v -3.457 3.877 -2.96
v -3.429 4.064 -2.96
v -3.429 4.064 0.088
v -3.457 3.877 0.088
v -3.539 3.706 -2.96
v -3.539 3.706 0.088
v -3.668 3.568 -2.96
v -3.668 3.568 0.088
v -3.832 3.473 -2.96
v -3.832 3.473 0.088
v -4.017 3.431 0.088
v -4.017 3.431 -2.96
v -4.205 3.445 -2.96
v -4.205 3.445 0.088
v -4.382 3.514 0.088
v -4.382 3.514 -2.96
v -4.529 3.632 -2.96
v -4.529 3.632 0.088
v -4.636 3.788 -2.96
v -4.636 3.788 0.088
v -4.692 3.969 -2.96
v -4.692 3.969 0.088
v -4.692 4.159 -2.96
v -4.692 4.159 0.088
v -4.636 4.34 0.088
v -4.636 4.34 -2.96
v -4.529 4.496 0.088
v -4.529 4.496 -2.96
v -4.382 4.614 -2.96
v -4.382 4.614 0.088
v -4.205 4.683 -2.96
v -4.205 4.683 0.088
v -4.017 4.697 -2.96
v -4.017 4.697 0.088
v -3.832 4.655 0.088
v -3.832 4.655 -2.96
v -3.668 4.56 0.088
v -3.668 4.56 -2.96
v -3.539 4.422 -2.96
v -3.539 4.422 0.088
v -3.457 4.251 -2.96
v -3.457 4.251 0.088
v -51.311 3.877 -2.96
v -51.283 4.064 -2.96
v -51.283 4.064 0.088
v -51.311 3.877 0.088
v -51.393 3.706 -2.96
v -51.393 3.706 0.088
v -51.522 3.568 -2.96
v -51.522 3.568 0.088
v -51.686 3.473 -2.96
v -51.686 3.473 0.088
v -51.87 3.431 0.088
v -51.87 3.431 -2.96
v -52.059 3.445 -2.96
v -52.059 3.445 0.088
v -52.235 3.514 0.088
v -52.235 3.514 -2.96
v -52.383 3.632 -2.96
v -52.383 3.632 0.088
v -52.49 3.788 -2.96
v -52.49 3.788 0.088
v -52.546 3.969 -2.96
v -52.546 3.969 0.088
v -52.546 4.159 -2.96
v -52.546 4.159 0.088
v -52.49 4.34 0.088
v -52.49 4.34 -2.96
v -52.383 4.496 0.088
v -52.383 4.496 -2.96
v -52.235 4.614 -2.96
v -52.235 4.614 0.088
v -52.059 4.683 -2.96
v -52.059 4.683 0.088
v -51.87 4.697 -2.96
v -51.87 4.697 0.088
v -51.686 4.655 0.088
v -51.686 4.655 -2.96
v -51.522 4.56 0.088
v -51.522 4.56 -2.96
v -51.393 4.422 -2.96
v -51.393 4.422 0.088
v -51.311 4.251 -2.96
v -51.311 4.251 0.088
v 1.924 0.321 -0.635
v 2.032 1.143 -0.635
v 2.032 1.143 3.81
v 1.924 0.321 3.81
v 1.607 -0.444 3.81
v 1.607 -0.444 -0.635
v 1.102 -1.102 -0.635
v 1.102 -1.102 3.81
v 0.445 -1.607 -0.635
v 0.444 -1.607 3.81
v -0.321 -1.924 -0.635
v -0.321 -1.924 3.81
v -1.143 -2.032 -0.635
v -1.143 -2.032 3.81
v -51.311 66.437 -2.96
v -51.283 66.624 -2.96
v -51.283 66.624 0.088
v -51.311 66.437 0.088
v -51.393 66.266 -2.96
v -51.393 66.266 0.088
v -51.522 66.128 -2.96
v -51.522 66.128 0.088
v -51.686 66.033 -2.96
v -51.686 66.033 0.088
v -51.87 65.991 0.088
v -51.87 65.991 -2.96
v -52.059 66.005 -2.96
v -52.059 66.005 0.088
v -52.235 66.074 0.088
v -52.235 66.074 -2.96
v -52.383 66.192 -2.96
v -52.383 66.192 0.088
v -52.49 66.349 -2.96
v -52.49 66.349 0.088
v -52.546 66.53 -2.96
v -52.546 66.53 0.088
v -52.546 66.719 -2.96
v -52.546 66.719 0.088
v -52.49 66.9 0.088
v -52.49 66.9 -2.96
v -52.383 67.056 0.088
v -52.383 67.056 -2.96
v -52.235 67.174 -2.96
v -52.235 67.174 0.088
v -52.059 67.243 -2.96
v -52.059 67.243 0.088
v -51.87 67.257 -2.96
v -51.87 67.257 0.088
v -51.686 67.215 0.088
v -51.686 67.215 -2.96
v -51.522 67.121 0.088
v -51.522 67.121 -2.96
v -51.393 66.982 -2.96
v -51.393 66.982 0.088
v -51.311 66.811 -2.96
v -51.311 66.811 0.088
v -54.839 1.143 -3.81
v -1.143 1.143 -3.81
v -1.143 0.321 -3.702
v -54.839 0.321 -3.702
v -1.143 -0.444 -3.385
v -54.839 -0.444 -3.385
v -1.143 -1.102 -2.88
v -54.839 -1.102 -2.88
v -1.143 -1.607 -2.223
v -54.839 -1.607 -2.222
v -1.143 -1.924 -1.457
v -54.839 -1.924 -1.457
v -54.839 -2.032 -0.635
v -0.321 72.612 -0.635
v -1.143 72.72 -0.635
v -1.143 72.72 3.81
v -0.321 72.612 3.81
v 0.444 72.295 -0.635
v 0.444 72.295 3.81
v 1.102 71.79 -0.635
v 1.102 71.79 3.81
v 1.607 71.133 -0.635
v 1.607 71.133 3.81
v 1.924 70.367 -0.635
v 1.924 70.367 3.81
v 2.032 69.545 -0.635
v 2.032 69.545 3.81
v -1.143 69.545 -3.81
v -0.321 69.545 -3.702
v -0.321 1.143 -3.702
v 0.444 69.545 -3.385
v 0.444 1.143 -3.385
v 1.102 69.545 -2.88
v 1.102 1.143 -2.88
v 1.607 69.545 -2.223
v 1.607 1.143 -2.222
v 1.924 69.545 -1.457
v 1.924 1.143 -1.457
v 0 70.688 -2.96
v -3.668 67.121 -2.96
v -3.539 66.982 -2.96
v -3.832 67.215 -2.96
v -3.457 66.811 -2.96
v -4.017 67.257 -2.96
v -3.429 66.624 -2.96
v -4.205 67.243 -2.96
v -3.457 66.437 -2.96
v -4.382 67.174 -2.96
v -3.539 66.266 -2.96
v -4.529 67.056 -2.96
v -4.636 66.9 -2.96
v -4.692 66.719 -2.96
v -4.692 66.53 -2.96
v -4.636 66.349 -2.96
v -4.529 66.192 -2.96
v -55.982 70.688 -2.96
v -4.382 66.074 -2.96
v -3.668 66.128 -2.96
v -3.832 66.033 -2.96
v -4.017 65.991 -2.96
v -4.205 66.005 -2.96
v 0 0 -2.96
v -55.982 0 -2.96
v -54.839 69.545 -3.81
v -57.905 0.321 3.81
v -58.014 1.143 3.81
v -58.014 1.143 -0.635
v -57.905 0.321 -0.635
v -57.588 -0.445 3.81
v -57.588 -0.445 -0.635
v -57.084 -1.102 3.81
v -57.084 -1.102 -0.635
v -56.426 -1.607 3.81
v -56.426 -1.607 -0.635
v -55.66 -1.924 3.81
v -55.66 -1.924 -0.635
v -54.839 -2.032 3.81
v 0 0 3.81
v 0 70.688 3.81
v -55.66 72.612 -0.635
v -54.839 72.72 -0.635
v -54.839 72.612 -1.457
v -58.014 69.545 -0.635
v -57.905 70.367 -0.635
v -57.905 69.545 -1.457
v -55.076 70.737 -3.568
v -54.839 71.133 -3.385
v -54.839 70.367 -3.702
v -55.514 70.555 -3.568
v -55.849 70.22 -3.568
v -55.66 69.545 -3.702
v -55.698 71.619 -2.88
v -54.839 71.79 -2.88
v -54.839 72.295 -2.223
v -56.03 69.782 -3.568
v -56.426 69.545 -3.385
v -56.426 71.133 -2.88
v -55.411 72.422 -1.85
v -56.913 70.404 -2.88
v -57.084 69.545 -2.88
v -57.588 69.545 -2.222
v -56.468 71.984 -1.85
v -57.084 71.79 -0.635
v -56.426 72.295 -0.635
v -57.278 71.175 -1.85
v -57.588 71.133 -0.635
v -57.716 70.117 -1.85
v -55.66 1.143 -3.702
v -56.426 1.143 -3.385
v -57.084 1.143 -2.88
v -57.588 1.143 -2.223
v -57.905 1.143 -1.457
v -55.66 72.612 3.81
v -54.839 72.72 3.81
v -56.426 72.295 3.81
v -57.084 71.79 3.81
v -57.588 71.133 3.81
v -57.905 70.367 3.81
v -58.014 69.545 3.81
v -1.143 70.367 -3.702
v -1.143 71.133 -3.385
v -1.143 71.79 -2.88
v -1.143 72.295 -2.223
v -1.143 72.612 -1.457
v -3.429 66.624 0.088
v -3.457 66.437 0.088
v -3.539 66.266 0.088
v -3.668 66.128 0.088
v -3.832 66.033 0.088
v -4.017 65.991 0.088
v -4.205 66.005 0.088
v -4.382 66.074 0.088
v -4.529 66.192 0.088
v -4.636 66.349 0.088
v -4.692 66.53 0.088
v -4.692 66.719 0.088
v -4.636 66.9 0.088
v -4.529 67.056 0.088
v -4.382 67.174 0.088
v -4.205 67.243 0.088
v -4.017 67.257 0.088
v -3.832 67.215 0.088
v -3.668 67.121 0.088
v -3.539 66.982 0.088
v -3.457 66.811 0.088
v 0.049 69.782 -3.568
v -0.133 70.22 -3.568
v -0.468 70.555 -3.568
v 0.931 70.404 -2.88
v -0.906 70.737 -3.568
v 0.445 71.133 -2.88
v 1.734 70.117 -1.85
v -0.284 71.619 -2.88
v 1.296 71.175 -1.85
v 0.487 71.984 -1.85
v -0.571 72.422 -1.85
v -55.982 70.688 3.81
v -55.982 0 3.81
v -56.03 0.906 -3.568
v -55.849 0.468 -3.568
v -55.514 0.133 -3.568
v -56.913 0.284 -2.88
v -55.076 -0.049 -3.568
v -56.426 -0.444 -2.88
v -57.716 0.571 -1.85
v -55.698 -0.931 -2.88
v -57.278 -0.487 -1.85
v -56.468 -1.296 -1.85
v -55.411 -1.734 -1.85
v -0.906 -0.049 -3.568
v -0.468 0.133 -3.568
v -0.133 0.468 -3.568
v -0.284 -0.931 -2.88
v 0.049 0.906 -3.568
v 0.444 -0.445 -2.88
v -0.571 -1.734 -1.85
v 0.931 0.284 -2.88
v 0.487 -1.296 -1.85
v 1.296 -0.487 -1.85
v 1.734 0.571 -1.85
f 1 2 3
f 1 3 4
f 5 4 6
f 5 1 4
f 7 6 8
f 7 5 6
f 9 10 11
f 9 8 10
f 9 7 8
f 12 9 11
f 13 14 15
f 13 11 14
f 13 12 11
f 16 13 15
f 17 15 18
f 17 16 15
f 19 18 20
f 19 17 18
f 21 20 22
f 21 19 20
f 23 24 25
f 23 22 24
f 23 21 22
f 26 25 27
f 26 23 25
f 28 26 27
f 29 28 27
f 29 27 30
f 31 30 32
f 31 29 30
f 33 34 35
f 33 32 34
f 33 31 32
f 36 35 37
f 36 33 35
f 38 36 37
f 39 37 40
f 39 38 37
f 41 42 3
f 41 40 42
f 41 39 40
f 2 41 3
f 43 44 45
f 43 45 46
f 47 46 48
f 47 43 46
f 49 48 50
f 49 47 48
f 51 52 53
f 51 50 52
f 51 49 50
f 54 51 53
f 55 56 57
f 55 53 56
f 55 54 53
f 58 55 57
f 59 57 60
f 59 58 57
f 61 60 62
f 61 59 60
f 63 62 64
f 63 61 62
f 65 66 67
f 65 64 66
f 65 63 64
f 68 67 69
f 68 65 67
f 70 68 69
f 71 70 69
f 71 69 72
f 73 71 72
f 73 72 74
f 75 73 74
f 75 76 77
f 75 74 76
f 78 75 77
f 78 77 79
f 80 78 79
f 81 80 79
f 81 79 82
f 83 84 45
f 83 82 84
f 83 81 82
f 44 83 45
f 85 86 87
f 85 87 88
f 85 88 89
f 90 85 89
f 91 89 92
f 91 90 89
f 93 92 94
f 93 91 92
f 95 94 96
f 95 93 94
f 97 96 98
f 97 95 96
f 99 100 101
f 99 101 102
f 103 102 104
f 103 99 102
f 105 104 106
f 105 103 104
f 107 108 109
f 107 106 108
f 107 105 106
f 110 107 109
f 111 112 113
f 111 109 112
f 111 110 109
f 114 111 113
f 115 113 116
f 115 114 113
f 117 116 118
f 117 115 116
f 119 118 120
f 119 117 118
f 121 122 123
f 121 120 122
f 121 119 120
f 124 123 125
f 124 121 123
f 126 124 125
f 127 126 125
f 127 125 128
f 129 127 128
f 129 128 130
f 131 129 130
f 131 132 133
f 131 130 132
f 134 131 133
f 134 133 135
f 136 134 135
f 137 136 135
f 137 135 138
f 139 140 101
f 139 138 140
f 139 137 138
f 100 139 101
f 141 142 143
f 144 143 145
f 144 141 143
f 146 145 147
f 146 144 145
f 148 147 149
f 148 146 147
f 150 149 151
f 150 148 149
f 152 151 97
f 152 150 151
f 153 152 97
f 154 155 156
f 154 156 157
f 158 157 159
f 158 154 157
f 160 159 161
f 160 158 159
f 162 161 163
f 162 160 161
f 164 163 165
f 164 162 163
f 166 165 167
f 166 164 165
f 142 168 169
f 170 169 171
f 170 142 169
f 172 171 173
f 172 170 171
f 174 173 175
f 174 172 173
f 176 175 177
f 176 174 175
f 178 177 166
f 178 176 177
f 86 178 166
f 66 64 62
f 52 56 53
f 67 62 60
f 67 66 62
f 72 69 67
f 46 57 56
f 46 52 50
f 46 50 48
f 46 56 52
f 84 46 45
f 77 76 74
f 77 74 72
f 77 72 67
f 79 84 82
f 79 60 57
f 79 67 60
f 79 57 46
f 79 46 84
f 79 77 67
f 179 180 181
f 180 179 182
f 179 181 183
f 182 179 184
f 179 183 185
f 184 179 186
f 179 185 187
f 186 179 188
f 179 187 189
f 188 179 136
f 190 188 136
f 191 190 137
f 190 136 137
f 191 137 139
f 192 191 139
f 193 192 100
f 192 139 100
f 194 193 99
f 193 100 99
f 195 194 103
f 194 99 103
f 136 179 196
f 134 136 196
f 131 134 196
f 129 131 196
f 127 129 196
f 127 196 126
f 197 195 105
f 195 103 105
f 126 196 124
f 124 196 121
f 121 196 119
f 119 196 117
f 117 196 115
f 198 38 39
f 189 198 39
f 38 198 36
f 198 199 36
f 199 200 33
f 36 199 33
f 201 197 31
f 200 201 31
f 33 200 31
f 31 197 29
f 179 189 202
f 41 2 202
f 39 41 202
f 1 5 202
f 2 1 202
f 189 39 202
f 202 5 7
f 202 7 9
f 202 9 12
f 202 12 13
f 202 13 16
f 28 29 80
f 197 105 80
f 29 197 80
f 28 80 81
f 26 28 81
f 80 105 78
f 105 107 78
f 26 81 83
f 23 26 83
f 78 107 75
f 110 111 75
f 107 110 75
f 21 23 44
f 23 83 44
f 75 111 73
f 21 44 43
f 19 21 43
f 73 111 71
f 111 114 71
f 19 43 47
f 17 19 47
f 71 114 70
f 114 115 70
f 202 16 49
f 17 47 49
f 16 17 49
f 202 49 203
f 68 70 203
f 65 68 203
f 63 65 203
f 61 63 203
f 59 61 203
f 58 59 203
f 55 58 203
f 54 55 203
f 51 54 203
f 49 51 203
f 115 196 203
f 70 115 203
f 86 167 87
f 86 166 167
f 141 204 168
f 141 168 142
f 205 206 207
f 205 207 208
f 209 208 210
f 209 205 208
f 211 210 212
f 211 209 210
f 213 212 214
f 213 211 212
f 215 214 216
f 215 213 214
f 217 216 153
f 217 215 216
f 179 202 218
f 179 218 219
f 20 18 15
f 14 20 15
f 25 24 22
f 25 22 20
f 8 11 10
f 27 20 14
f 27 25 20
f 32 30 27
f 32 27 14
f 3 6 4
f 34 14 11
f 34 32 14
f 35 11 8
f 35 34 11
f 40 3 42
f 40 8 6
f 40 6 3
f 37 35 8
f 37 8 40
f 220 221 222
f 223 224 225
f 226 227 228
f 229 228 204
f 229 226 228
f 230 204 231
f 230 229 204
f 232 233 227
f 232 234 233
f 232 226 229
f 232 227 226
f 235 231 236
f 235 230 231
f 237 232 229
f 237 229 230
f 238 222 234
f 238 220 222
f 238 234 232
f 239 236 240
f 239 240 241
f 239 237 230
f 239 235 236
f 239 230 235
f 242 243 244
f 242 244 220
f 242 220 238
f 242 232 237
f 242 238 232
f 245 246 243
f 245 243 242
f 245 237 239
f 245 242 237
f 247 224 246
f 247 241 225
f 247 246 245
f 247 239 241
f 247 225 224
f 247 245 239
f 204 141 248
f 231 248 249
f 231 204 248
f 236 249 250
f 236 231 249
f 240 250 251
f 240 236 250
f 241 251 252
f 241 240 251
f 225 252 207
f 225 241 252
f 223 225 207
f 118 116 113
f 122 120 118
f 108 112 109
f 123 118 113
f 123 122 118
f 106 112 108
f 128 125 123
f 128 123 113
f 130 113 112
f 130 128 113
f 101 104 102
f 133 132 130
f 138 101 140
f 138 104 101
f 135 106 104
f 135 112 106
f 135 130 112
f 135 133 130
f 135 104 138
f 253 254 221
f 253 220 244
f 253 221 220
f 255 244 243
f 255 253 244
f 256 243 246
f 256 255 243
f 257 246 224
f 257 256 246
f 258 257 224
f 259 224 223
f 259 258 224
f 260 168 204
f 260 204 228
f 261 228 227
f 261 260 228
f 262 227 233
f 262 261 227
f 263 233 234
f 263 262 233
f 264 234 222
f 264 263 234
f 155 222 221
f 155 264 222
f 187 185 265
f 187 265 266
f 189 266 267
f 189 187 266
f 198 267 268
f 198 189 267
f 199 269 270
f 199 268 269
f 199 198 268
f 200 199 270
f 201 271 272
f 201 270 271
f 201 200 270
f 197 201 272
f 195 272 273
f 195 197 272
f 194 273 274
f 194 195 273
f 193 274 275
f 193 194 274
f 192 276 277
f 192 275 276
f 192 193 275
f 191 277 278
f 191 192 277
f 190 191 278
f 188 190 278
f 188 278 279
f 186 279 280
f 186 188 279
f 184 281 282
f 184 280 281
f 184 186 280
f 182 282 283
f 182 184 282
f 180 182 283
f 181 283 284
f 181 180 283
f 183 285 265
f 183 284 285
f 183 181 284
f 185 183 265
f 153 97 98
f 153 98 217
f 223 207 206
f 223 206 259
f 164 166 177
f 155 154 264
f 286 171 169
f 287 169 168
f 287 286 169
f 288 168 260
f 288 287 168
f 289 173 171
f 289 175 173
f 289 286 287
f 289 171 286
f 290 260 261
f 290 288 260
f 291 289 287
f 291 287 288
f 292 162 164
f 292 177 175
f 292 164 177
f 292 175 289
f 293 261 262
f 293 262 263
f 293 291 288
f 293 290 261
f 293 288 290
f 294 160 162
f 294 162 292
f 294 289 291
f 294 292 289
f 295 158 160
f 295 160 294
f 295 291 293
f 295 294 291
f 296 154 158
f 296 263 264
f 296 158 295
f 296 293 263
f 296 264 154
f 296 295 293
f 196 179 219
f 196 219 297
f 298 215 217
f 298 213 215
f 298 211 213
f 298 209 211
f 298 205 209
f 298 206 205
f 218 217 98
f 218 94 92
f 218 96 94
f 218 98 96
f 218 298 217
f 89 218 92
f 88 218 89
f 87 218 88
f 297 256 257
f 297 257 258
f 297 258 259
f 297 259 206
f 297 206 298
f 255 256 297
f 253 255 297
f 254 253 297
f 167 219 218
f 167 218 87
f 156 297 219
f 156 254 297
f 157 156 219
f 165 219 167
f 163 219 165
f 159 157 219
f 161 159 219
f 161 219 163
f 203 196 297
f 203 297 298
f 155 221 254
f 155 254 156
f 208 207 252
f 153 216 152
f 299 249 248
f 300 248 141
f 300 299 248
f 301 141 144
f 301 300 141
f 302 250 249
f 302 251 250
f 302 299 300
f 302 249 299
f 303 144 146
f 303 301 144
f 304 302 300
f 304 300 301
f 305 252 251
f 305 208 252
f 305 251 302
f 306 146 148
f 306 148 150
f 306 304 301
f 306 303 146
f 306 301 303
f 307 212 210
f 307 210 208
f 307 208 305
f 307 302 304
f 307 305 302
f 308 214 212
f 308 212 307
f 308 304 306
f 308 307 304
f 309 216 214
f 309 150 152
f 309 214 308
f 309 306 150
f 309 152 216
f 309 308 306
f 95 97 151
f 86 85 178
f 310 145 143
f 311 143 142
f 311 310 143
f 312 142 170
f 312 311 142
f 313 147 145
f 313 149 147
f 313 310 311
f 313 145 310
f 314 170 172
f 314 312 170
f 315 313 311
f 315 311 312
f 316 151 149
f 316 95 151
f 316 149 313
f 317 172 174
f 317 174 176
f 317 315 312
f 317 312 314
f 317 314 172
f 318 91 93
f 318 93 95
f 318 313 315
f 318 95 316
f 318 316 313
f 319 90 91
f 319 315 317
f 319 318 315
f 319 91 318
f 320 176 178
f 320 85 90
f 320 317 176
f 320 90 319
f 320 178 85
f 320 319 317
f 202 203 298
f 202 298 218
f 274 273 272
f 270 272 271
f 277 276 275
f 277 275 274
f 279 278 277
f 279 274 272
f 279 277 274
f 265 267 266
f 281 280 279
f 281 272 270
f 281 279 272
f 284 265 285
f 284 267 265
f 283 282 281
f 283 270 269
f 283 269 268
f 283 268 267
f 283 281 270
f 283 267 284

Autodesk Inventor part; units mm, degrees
ref_plane "YZ Plane" through (0, 0, 0) normal (1, 0, 0) x (0, 1, 0)
ref_plane "XZ Plane" through (0, 0, 0) normal (0, 1, 0) x (-1, 0, 0)
ref_plane "XY Plane" through (0, 0, 0) normal (0, 0, 1) x (1, 0, 0)
sketch "Sketch1" plane through (0, 0, 0) normal (0, 0, 1) x (1, 0, 0)
  line L0 (0, 0) -> (0, 70.6882)
  line L1 (0, 70.6882) -> (-55.9816, 70.6882)
  line L2 (-55.9816, 70.6882) -> (-55.9816, 0)
  line L3 (-55.9816, 0) -> (0, 0)
  line L4 (-58.0136, 72.7202) -> (2.032, 72.7202)
  line L5 (2.032, 72.7202) -> (2.032, -2.032)
  line L6 (2.032, -2.032) -> (-58.0136, -2.032)
  line L7 (-58.0136, -2.032) -> (-58.0136, 72.7202)
  dimension "d0" = 70.6882
  dimension "d1" = 55.9816
  dimension "d2" = 70.6882
  dimension "d3" = 2.032
extrude "Extrusion1" add sketch "Sketch1" along normal mid plane 7.62
sketch "Sketch2" plane through (-55.9816, 0, 3.81) normal (1, 0, 0) x (0, 0, -1)
  line L0 (7.62, 72.7202) -> (0, 72.7202) projected
  line L1 (7.62, 72.7202) -> (6.858, 72.7202)
  line L2 (7.62, 70.6882) -> (0, 70.6882) projected
  line L3 (7.62, 70.6882) -> (6.7695, 70.6882)
  line L4 (6.7695, 70.6882) -> (6.7695, 0)
  line L5 (7.62, 0) -> (0, 0) projected
  line L6 (6.7695, 0) -> (7.62, 0)
  line L7 (7.62, 70.6882) -> (7.62, 0) projected
  line L8 (7.62, 0) -> (7.62, 70.6882)
  line L9 (7.62, 0) -> (7.62, 70.6882) projected
  line L10 (7.62, 70.6882) -> (6.8499, 70.6882)
  line L11 (0, 0) -> (7.62, 0) projected
  line L12 (6.7695, 0) -> (7.62, 0)
  line L13 (7.62, 0) -> (7.62, 70.6882)
  line L14 (6.6596, 0) -> (7.62, 0)
  line L15 (7.62, 72.7202) -> (7.62, -2.032) projected
  point P0 (3.81, 0)
  dimension "d6" = 0.762
  dimension "d7" = 70.6882
extrude "Extrusion2" add sketch "Sketch2" along normal blind 55.9816
sketch "Sketch3" plane through (-55.9816, 0, -2.9595) normal (0, 0, 1) x (1, 0, 0)
  line L0 (55.9816, 0) -> (0, 0) projected
  line L1 (55.9816, 70.6882) -> (55.9816, 0) projected
  circle A0 centre (51.9176, 4.064) radius 0.635
  line L2 (0, 0) -> (0, 70.6882) projected
  line L3 (0, 0) -> (0, 4.064)
  circle A1 centre (4.064, 4.064) radius 0.635
  line L4 (0, 70.6882) -> (55.9816, 70.6882) projected
  circle A2 centre (4.064, 66.6242) radius 0.635
  line L5 (55.9816, 70.6882) -> (55.9816, 66.6242)
  circle A3 centre (51.9176, 66.6242) radius 0.635
  dimension "d12" = 1.27
  dimension "d15" = 1.27
  dimension "d18" = 1.27
  dimension "d21" = 1.27
extrude "Extrusion3" add sketch "Sketch3" along normal blind 3.048 contours A0 | A1 | A2 | A3
fillet "Fillet1" radius 3.175 4 edges at (2.032, 72.7202, 0) (2.032, -2.032, 0) (-58.0136, 72.7202, 0) (-58.0136, -2.032, 0)
fillet "Fillet2" radius 3.175 8 edges at (1.1021, 71.7903, -3.81) (2.032, 35.3441, -3.81) (1.1021, -1.1021, -3.81) (-27.9908, -2.032, -3.81) (-57.0837, -1.1021, -3.81) (-58.0136, 35.3441, -3.81) (-57.0837, 71.7903, -3.81) (-27.9908, 72.7202, -3.81)
sketch "Sketch4" plane through (0, 0, 3.81) normal (0, 0, 1) x (1, 0, 0)
  line L0 (0, 0) -> (-55.9816, 0) projected
  line L1 (-54.8386, 1.143) -> (-1.143, 1.143) projected
  line L2 (-55.9816, 0) -> (-34.6456, 0)
  line L3 (-34.6456, 0) -> (-34.6456, 10.414)
  line L4 (-34.6456, 10.414) -> (-20.4216, 10.414)
  line L5 (-20.4216, 10.414) -> (-20.4216, 0)
  line L6 (0, 70.6882) -> (0, 0) projected
  line L7 (-20.4216, 0) -> (0, 0)
  dimension "d27" = 21.336
  dimension "d28" = 10.414
  dimension "d31" = 14.224
  dimension "d32" = 10.414
  dimension "d33" = 20.4216
properties part number "Box"
